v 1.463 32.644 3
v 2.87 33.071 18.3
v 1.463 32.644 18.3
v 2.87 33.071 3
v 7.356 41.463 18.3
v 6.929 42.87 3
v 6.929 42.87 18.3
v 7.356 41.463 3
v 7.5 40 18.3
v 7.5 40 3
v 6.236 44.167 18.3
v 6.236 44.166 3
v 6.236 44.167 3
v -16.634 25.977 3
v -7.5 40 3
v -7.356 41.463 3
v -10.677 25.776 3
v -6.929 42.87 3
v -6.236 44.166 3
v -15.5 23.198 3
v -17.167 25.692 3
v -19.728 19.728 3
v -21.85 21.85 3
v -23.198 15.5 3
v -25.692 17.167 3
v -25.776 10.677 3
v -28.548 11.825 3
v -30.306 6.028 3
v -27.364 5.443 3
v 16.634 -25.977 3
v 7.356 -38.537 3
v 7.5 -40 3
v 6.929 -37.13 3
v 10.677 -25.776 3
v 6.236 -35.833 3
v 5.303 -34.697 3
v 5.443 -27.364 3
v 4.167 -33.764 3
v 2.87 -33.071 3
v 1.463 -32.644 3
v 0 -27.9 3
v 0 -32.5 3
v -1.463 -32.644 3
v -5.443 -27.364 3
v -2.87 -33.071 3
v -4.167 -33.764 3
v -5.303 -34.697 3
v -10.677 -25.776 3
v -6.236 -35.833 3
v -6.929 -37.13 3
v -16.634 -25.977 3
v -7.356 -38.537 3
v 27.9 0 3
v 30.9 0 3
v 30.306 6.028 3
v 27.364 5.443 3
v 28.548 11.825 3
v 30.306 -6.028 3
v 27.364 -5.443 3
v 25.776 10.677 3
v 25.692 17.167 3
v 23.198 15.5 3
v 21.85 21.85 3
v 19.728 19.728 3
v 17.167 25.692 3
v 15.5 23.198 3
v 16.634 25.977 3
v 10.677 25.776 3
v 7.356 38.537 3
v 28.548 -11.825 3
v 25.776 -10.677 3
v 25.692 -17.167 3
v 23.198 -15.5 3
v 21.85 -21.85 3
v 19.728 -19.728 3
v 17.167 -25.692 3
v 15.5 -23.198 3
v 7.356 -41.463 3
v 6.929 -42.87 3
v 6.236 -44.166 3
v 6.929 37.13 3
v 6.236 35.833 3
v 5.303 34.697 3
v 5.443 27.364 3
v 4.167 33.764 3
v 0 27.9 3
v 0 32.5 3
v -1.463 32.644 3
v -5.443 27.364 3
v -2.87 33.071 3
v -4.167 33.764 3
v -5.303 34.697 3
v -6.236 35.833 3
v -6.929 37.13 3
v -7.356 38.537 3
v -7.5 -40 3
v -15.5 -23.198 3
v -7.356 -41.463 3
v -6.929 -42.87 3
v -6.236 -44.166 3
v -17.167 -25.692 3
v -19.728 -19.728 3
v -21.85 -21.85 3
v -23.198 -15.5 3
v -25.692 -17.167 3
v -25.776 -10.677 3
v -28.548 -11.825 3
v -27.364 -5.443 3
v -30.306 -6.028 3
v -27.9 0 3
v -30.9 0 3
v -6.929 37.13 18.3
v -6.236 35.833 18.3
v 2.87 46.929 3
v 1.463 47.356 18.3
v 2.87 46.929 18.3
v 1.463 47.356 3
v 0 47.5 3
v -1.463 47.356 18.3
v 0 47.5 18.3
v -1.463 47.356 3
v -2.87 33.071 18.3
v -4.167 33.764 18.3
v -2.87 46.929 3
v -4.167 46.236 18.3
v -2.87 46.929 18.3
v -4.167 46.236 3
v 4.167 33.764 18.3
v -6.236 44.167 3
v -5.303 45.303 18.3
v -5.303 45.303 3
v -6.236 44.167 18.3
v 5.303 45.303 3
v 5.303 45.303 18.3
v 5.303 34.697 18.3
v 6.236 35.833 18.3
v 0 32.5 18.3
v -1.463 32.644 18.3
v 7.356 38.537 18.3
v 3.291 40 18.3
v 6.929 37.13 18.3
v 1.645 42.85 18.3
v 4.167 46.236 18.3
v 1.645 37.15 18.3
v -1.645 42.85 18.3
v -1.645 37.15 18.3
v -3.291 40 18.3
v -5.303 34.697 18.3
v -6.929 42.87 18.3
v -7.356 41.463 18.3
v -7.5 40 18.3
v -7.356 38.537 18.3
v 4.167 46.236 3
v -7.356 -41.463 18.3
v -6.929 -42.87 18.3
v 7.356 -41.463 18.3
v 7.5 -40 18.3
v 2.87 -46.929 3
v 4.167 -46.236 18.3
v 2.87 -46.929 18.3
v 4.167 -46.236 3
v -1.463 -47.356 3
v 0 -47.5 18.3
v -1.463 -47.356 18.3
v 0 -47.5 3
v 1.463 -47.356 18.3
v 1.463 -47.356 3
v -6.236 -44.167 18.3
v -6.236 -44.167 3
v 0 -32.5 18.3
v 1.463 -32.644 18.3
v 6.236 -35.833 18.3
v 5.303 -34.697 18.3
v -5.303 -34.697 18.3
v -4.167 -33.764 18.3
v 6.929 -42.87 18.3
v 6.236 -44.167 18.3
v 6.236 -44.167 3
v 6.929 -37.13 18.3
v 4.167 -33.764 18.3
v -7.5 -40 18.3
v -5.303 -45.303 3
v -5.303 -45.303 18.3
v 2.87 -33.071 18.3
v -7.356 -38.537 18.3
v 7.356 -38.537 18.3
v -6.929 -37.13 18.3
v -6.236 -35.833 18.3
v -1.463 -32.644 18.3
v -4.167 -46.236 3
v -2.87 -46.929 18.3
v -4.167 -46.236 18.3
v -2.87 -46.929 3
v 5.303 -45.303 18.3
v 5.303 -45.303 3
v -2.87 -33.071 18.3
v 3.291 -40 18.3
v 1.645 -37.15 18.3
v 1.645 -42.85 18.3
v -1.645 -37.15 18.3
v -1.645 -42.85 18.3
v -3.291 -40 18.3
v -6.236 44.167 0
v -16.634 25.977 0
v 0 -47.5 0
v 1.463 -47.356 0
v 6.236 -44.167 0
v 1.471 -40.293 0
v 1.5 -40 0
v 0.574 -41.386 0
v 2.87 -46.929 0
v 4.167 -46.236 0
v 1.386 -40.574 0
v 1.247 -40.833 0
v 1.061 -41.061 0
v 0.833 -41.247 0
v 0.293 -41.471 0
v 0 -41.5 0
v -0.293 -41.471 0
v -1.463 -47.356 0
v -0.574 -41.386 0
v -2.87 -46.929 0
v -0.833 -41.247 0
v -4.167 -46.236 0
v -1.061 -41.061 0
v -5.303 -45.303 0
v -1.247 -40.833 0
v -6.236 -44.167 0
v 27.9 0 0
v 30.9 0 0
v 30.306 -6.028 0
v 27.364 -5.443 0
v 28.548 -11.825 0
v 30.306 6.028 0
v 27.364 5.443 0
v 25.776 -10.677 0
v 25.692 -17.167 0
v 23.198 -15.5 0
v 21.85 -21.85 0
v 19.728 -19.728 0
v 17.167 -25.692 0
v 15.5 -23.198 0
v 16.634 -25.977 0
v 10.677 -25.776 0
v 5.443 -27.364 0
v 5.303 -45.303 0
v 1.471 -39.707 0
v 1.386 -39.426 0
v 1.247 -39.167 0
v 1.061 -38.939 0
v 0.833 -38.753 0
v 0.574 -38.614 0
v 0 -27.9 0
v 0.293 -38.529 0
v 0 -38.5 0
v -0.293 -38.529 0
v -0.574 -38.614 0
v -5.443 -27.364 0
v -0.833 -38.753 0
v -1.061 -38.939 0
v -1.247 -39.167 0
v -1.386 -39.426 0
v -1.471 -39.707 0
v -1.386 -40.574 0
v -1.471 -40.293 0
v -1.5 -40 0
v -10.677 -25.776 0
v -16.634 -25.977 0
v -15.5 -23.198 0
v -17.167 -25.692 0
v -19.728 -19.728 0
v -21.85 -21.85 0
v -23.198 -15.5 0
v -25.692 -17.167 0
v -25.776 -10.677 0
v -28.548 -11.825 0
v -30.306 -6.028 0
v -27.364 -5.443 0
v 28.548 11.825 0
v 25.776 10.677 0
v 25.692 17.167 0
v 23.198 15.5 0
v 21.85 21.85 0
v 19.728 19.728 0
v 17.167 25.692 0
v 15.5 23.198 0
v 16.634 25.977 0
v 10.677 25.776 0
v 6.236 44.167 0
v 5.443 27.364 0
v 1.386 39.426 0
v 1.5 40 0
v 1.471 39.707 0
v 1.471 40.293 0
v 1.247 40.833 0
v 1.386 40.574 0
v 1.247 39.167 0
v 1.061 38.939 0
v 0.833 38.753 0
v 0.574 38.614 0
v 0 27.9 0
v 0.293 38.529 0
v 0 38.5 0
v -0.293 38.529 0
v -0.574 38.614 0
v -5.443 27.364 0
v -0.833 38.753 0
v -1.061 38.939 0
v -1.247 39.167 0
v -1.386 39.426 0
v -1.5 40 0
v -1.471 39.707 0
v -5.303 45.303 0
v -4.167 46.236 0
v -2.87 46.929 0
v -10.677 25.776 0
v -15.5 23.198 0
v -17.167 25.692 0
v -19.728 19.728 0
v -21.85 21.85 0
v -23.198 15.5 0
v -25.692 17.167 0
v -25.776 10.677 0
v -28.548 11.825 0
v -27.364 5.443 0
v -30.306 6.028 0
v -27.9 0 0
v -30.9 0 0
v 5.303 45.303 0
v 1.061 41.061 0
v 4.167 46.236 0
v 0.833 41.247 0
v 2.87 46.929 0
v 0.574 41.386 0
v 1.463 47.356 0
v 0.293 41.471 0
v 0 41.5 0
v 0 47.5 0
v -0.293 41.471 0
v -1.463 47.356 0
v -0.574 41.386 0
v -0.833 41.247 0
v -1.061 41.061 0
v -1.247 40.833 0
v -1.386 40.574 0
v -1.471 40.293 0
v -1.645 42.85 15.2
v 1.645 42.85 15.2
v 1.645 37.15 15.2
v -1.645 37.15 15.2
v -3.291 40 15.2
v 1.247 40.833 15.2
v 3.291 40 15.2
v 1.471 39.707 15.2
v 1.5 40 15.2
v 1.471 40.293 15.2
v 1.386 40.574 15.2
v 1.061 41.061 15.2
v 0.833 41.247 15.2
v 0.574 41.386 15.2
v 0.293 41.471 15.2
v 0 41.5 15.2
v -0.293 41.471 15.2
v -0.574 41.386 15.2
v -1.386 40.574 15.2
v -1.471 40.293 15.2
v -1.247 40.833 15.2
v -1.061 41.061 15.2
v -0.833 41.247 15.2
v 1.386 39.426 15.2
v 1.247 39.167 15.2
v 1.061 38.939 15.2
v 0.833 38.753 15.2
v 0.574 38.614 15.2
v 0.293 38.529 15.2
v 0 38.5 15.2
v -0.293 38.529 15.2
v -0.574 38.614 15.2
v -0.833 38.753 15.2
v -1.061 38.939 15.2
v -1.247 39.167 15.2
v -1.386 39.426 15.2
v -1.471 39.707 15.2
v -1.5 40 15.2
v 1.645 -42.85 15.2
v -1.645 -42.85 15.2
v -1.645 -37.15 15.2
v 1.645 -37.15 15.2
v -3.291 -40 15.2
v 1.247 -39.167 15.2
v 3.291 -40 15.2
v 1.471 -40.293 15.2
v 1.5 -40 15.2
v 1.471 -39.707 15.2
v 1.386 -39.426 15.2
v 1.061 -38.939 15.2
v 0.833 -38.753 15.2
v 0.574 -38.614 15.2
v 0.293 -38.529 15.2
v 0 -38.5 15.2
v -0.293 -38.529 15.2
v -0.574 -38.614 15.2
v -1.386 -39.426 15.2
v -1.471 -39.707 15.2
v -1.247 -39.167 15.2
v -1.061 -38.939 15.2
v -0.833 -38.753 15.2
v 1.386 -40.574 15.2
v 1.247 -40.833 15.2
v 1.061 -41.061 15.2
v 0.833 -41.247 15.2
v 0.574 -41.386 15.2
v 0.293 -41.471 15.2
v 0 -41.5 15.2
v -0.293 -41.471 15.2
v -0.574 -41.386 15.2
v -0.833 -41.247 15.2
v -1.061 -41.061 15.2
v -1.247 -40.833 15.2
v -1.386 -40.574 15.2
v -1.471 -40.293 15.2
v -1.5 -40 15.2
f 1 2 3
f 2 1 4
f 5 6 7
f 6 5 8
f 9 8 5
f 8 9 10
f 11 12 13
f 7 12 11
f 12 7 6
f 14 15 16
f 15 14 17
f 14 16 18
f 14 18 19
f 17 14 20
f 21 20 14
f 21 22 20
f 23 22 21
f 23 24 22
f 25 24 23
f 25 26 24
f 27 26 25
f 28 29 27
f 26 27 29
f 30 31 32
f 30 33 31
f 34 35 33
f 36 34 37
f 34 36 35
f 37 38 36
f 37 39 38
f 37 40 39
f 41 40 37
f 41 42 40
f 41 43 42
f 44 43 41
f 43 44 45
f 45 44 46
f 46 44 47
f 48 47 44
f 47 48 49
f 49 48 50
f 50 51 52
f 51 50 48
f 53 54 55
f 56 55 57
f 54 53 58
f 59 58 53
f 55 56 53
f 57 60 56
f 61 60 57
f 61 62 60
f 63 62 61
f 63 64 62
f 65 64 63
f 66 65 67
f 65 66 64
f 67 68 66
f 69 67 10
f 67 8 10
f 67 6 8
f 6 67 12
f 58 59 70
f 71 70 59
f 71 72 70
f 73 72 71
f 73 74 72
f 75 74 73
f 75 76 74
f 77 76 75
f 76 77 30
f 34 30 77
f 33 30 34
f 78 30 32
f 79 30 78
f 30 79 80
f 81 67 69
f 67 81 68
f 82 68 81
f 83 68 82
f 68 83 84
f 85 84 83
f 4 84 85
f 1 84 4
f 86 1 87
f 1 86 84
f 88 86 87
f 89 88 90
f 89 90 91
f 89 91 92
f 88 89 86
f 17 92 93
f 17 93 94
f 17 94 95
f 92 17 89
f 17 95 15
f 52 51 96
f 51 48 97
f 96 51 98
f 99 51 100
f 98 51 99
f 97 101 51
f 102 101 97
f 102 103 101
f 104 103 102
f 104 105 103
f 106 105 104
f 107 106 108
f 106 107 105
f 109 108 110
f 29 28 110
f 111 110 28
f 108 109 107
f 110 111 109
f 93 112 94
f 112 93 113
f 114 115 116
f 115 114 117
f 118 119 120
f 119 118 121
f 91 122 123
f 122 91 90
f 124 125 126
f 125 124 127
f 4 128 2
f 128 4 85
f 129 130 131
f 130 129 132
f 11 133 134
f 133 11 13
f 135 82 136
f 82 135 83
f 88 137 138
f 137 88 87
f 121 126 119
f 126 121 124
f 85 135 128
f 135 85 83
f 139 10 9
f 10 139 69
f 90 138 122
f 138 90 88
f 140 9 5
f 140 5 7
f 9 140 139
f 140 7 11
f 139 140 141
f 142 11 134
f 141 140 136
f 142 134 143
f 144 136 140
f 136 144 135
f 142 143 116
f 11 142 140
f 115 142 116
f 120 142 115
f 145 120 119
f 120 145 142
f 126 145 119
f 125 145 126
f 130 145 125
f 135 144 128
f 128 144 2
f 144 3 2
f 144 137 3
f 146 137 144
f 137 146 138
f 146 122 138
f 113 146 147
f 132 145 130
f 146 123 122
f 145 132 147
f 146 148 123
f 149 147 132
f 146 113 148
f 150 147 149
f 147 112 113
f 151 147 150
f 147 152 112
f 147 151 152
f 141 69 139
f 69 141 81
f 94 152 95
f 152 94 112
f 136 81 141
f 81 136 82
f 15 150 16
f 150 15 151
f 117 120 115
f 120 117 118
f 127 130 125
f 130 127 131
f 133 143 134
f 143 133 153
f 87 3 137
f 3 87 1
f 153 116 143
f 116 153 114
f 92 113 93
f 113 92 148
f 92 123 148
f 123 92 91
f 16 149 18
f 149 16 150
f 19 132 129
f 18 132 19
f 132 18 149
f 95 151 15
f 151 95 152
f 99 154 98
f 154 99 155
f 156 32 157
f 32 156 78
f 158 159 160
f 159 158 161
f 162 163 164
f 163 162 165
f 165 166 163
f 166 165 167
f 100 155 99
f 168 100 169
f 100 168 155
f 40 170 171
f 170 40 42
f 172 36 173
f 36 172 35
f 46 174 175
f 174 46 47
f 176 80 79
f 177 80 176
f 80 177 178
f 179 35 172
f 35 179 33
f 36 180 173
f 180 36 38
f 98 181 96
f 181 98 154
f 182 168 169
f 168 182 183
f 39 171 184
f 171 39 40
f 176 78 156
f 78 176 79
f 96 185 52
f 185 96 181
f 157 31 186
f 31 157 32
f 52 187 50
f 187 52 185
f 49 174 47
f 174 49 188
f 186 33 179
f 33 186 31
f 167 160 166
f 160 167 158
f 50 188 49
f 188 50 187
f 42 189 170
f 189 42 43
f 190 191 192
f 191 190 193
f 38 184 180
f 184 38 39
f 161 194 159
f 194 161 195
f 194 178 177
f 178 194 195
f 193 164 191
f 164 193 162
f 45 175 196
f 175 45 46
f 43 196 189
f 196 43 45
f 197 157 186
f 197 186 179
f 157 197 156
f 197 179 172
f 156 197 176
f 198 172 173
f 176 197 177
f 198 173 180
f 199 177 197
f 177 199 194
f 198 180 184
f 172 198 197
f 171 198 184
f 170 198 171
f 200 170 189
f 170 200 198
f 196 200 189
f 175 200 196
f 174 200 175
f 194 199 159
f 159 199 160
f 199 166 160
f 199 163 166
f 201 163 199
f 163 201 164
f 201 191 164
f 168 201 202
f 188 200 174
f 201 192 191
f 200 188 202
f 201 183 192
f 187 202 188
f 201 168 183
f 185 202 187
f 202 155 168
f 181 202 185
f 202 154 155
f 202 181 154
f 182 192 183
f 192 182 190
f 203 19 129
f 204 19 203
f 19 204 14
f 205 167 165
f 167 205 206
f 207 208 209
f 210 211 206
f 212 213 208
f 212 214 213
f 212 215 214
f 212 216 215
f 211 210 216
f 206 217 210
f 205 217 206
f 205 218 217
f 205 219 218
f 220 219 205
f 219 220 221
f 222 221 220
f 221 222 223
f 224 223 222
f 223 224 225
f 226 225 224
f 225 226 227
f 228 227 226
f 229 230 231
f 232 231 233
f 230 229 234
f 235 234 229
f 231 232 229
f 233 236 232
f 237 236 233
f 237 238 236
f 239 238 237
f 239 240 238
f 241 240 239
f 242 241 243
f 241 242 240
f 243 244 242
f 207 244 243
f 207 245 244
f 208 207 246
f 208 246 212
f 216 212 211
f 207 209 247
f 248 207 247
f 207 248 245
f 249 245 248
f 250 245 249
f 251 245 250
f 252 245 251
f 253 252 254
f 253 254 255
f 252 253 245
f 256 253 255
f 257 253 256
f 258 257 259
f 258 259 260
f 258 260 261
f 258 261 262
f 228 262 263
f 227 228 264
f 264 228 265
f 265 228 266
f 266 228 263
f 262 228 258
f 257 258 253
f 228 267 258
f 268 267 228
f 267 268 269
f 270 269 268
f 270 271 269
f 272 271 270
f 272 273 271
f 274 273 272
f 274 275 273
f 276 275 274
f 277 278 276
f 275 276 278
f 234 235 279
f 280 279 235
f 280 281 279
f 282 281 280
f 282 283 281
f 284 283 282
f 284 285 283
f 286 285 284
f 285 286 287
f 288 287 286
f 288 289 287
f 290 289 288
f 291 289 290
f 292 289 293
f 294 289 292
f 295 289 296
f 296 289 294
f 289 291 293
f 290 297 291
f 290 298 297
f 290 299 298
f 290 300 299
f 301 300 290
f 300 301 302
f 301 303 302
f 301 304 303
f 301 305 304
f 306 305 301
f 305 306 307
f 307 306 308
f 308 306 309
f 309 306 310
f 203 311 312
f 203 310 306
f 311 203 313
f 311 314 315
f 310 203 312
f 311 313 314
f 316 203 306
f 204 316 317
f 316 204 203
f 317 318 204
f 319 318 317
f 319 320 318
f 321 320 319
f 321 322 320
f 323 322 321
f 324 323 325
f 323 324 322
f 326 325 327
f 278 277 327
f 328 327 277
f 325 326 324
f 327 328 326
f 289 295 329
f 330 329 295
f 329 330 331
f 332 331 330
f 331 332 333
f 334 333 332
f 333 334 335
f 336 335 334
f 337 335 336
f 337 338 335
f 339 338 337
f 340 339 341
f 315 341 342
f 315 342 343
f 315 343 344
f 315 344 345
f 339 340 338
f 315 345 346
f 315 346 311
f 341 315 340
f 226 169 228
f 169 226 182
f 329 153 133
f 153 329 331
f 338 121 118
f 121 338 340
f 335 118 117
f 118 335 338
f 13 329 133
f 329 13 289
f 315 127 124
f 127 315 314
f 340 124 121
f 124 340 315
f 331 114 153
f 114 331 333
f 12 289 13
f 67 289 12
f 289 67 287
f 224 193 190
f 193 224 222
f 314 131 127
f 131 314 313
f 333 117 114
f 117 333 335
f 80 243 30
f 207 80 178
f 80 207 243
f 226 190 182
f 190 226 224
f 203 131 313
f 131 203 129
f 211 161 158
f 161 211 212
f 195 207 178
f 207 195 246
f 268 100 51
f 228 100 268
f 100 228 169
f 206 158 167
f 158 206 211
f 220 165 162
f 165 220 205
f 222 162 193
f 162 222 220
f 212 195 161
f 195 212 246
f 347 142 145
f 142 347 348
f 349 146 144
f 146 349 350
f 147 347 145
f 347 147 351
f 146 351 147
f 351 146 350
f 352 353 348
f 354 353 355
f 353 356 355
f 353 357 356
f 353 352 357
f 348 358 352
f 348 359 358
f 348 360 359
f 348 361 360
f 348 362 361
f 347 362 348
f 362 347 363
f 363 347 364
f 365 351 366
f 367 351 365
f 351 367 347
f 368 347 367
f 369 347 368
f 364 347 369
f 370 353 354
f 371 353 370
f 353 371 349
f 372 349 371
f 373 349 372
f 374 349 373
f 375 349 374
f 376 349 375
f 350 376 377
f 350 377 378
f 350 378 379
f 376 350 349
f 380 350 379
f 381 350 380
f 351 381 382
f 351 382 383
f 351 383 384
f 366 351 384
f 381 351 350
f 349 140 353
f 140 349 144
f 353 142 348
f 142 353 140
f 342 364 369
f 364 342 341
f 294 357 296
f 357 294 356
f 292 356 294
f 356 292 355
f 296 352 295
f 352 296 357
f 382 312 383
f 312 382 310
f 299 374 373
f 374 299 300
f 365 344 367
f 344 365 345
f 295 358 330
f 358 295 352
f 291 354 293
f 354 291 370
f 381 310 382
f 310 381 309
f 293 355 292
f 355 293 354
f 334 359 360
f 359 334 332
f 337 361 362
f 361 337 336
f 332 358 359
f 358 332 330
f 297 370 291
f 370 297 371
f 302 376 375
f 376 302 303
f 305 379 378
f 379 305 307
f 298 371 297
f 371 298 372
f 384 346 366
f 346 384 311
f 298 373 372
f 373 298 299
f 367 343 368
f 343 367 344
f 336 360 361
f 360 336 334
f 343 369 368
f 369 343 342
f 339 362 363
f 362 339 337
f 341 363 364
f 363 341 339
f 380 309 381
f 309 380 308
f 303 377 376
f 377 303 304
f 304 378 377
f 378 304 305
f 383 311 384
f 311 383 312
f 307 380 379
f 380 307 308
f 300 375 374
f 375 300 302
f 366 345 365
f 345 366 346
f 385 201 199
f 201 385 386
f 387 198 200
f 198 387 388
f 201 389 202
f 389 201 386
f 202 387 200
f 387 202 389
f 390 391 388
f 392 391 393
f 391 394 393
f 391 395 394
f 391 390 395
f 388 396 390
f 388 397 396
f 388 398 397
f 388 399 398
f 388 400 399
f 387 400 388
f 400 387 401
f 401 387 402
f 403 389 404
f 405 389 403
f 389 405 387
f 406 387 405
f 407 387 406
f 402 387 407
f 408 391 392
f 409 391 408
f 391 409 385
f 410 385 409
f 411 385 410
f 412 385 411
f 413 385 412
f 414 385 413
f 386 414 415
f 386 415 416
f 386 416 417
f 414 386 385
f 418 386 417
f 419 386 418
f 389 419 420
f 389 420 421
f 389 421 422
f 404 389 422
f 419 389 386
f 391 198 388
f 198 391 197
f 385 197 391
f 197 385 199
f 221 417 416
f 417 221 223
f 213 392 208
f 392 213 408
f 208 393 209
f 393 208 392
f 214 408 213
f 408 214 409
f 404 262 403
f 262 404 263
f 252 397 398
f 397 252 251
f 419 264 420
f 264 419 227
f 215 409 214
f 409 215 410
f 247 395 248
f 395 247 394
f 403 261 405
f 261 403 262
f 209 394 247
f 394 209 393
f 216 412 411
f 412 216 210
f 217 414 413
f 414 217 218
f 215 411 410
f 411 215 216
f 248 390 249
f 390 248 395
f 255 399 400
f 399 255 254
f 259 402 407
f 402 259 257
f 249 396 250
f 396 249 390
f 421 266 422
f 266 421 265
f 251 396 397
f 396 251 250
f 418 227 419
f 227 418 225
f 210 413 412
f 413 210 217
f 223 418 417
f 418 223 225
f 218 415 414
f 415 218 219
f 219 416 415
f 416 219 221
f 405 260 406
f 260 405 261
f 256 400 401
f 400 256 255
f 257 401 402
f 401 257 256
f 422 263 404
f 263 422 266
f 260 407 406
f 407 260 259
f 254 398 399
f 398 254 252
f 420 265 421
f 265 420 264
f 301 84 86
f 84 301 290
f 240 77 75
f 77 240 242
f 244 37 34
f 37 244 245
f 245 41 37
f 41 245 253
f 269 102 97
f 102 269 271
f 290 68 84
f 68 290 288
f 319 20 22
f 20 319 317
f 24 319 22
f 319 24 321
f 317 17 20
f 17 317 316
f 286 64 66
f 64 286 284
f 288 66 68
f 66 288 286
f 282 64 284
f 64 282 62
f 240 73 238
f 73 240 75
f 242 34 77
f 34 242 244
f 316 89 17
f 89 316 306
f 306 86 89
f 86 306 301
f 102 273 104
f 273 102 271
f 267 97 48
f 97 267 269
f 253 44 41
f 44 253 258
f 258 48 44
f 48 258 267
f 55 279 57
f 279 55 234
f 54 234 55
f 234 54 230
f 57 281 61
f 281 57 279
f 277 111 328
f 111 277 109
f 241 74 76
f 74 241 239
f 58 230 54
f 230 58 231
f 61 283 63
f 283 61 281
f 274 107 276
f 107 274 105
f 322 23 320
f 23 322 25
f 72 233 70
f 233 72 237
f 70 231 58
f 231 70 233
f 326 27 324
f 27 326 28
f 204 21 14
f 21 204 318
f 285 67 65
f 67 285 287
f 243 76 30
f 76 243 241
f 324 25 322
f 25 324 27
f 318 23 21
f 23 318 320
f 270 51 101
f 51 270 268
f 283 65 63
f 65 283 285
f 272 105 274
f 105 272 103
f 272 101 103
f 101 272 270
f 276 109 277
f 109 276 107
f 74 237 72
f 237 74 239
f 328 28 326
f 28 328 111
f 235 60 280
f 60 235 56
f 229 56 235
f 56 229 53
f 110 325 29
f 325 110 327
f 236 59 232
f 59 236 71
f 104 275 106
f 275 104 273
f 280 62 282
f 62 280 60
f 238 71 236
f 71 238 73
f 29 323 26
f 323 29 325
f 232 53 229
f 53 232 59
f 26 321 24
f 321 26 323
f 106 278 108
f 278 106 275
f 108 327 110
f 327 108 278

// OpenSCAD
// file: oem/generic/third_party/shortcuts.scad
// ShortCuts.scad 
// Autor: Rudolf Huttary, Berlin 2015
//
$fn = 100; 


//show_examples(); 

module show_examples()
	place_in_rect(30, 30)
	{
		Cy(h = 10); 
		CyH(h = 10); 
		CyH(h = 10, w = 30); 
		CyS(h = 10); 
		CyS(h = 10, w1 = 25, w2 = 75); 
		Cu(10); 
		Ri(h = 10); 
		RiH(h = 10); 
		RiS(h = 10, w1 = 10); 
		RiS(h = 10, w1 = 30, w2 = 300); 
		Sp(); 
		SpH(10, 30, 30); 
	}



module help()
{
echo("==============="); 
echo("help(): shows this help"); 
echo("show_examples(): shows some examples"); 
echo("place_in_rect(): places children objects in grid"); 
echo("Transformations:"); 
echo(" transform :  T(x=0, y=0, z=0), Tx(x=0) , Ty(y=0), Tz(z=0)"); 
echo(" rotate :  R(x=0, y=0, z=0), Rx(x=0) , Ry(y=0), Rz(z=0)"); 
echo(" scale :  S(x=1, y=1, z=1), Sx(x=1) , Sy(y=1), Sz(z=1)"); 
echo("Logical"); 
echo(" difference :  D()"); 
echo(" union :  U()"); 
echo(" intersection : *missing*"); 
echo("Primitives"); 
echo(" circle :  Ci(r=10)"); 
echo(" circle_half :  CiH(r=10, w=0)")
echo(" circle_segment :  CiS(r=10, w1=0, w2=90)")
echo(" square :  Sq(x=10, y=0, center=true))"); 
echo(" cylinder :  Cy(r=10, h=1, center=true)"); 
echo(" cylinder_half :  CyH(r=10, w=0)")
echo(" cylinder_segment: CyS(r=10, h=1, w1=0, w2=90,center=true)"); 
echo(" cylinder_segment: Pie(r=10, h=1, w1=0, w2=90,center=true)"); 
echo(" cube :  Cu(x=10, y=0, z=10, center=true)"); 
echo(" ring :  Ri(R=10, r=5, h=1, center=true)"); 
echo(" ring_half :  RiH(R=10, r=5, h=1, w=0 center=true)"); 
echo(" ring_segment :  RiS(R=10, r=5, h=1, w1=0, w2=90, center=true)"); 
echo(" sphere:  Sp(r=10))"); 
echo(" sphere_half:  SpH(r=10, w1 = 0, w2 = 0))"); 
echo("==============="); 
}


// Euclidean Transformations

module T(x=0, y=0, z=0){translate([x, y, z])children(); }
module Tx(x) { translate([x, 0, 0])children(); }
module Ty(y) { translate([0, y, 0])children(); }
module Tz(z) { translate([0, 0, z])children(); }


module R(x=0, y=0, z=0){rotate([x, y, z]) children();}
module Rx(x=90){rotate([x, 0, 0]) children();}
module Ry(y=90){rotate([0, y, 0]) children();}
module Rz(z=90){rotate([0, 0, z]) children();}

module S(x=1, y=1, z=1){scale([x, y, z]) children();}
module Sx(x=1){scale([x, 1, 1]) children();}
module Sy(y=1){scale([1, y, 1]) children();}
module Sz(z=1){scale([1, 1, z]) children();}


module D() difference(){children(0); children([1:$children-1]);}
module U() children([0:$children-1]);
// module I() intersection()children([0:$children-1]); // does not work for some reason


// primitives - 2D

module Sq(x =10, y = 0, center = true)
{
   if(y==0)
		square([x, x], center = center); 
	else
		square([x, y], center = center); 
}
module Ci(r = 10)
{
	circle(r = r); 
}

// derived primitives - 2d
module CiH(r = 10, w = 0)
  circle_half(r, w); 

module CiS(r = 10, w1 = 0, w2 = 90)
  circle_segment(r, w1, w2); 


// primitives - 3d
module Cy(r = 10, h = 1, center = true)
{
	cylinder(r = r, h = h, center = center); 
}
module Cu(x = 10, y = 0, z = 10, center = true)
{
  if (y==0)
	cube([x, x, x], center = center); 
  else
	cube([x, y, z], center = center); 
}

// derived primitives - 3d
module CyH(r = 10, h = 1, w = 0, center = true)
  cylinder_half(r, h, w, center); 

module CyS(r = 10, h = 1, w1 = 0, w2 = 90, center = true)
  cylinder_segment(r, h, w1, w2, center); 

module Ri(R = 10, r = 5, h = 1, center = true)
  ring(R, r, h, center); 

module RiS(R = 10, r = 5, h = 1, w1 = 0, w2 = 90, center = true)
   ring_segment(R, r, h, w1, w2, center); 

module RiH(r1 = 10, r2, h = 1, w = 0, center = true)
   ring_half(r1, r2, h, w, center); 
module Pie(r = 10, h = 1, w1 = 0, w2 = 90, center = true)
  cylinder_segment(r, h, w1, w2, center);  
module Sp(r = 10)
  sphere(r); 
module SpH(r = 10, w1 = 0, w2 = 0)
  sphere_half(r, w1, w2); 
module SpS(r = 10, w1 = 0, w2 = 90, w3 = 90)
  sphere_segment(r, w1, w2); 




// clear text definitions
module circle_half(r = 10, w = 0)
{
	difference()
	{
		circle(r); 
     rotate([0, 0, w-90])
     translate([0, -r])
		square([r, 2*r], center = false); 
	}
}

module circle_segment(r = 10, w1 = 0, w2 = 90)
{
  W2 = (w1>w2)?w2+360:w2; 
  if (W2-w1 < 180)
    intersection()
		{
       circle_half(r, w1); 
       circle_half(r, W2-180); 
 		}
	else
    union()
		{
       circle_half(r, w1); 
       circle_half(r, W2-180); 
 		}
}

module cylinder_half(r = 10, h = 1, w = 0, center = true)
{
  linear_extrude(height = h, center = center)
  circle_half(r, w); 
} 

module cylinder_segment(r = 10, h = 1, w1 = 0, w2 = 90, center = true)
{
  linear_extrude(height = h, center = center)
  circle_segment(r, w1, w2); 
} 

module ring(R = 10, r = 5, h = 1, center = true)
{
	difference()
	{
	cylinder(r = R, h = h, center = center); 
   translate([0, 0, -2*h])
	cylinder(r = r, h = 4*h, center = false); 
	}
}

module ring_half(R = 10, r = 5, h = 1, w = 0, center = true)
{
	difference()
	{
		ring(R, r, h, center); 
     rotate([0, 0, w])
     translate([0, -R/2, 0])
		cube([2*R, R, 3*h], center = true); 
	}
}

module ring_segment(R = 10, r = 5, h = 1, w1 = 0, w2 = 90, center = true)
{
  W2 = (w1>w2)?w2+360:w2; 
  if (W2-w1 < 180)
    intersection()
		{
       ring_half(R, r, h, w1, center); 
       ring_half(R, r, h, W2-180, center); 
 		}
	else
    union()
		{
       ring_half(R, r, h, w1, center); 
       ring_half(R, r, h, W2-180, center); 
 		}
}


module sphere_half(r = 10, w1 = 0, w2 = 0)
{  
	difference()
	{
   	sphere(r); 
      rotate([-w1, -w2, 0])
     	translate([0, 0, r])
		cube(2*r, 2*r, r, center = true); 
	}

}


// additional code
module place_in_rect(dx =20, dy=20)
{
  cols = ceil(sqrt($children)); 
  rows = floor(sqrt($children)); 
  for(i = [0:$children-1])
	{ 
	  T(dx*(-cols/2+(i%cols)+.5), dy*(rows/2-floor(i/cols)-.5))
		 children(i); 
	}
}
// file: oem/generic/third_party/springs.scad
include <shortcuts.scad>  // http://www.thingiverse.com/thing:644830
$fn = 100;
help();
//examples();  // slow!! F6 takes hours!
module examples()
{
place_in_rect(60, 60)
{
// examples spring:
	spring(Windings = 7, R = 10, r = 1, h = 20);  // clockwise
	R(90) spring(Windings = 3, R = 12, r = 2, h = -60); // ccw

// examples helicoils:
	helicoil(Windings = 10);  // square wire
	helicoil(clockwise = false, square = true);  // ccw + round wire

// examples elliptic rings:
	elliptic_ring(10, 5, 1);
	elliptic_ring(10, 10, 1);  // non elliptic
	elliptic_ring(h = 10);  // element of a spring
	elliptic_ring(h = 10, w = 240);  // partial ring

// example chain:
	U()
	{
	 Rx(90) T(15) elliptic_ring(); 
	 elliptic_ring(); 
	 Rx(90) T(-15) elliptic_ring(); 
	}
}
}

module help()
{
	echo("===== springs.scad - signatures [by Rudolf Huttary, Berlin] ===="); 
	echo("elliptic_ring(r1 = 10, r2 = 5, r = 2, slices = 100, h = 0, w = 360)
"); 
	echo("helicoil(Windings = 5, R = 20, r = 1, slices = 50, clockwise = true, square = true)"); 
	echo("spring(Windings = 5, R = 20, r=2, h = 20, slices = 50)"); 
	echo("elliptic_spring(Windings = 5, R1 = 20, R2 = 0, r=1, h = 20, slices = 50)"); 
	echo("===== springs.scad - end ===="); 
}


module elliptic_ring(r1 = 10, r2 = 5, r = 2, slices = 100, h = 0, w = 360)
{
	dz = h/slices; 
   dwx = atan(h/(r1+r2)/PI); 
	for (i = [0:slices-1])
	hull()
	{
		T(r1*cos((i+1)*w/slices), r2*sin((i+1)*w/slices), (i+1)*dz)
	   R(90+dwx, 0, (i+1)*w/slices)
		Cy(r = r, h = .01); 
	
		T(r1*cos((i)*w/slices), r2*sin((i)*w/slices), i*dz)
	   R(90+dwx, 0, i*w/slices)
		Cy(r = r, h = .01); 
	}
}

module helicoil(Windings = 5, R = 20, r = 1, slices = 50, clockwise = true, square = true)
{
  $fn = square? 4 :$fn; 
  h = clockwise?Windings*2*r:-Windings*2*r; 
  spring(Windings, R, r, h, slices); 
  T((.5*R)/2, r)
  Ry(90 )
  Cy(r, 1.5*R); 
}

module spring(Windings = 5, R = 20, r=2, h = 20, slices = 50)
	elliptic_spring(Windings, R, 0, r, h, slices); 

module elliptic_spring(Windings = 5, R1 = 20, R2 = 0, r=1, h = 20, slices = 50)
{
   dh = h/Windings;   
   r2 = (R2==0)?R1:R2; 
	for(j = [0:Windings-1])
		Tz(j*dh)
		elliptic_ring(R1, r2, r, slices, dh); 
}
// file: oem/m3_nut.scad
function vM3NutDatasheet() =
     [["e_min", 6.01], ["s_max", 5.5], ["m_max", 2.4]];



module mM3Nut() {
     import("stl/din934_m3_nut.stl");
}

mM3Nut();
// file: oem/f2276_sae1070_spring.scad
include <generic/lib.scad>;

use <generic/third_party/springs.scad>

function vF2276SAE1070SpringDatasheet() =
     let(wire_diameter=1, outer_diameter=18.1,
         inner_diameter=outer_diameter-2*wire_diameter,
         n_windings=8, free_length=43)
     [["outer_diameter", outer_diameter],
      ["inner_diameter", inner_diameter],
      ["wire_diameter", wire_diameter],
      ["pitch", free_length/n_windings],
      ["n_windings", n_windings],
      ["free_length", free_length]];

kF2276SAE1070SpringLength = property(vF2276SAE1070SpringDatasheet(), "free_length");

module mF2276SAE1070Spring(length=kF2276SAE1070SpringLength) {
     assert(length > 0);
     assert(length <= kF2276SAE1070SpringLength);

     datasheet = vF2276SAE1070SpringDatasheet();
     n_windings = property(datasheet, "n_windings");
     main_radius = (property(datasheet, "outer_diameter") +
                    property(datasheet, "inner_diameter")) / 4;
     wire_radius = property(datasheet, "wire_diameter") / 2;

     translate([0, 0, wire_radius])
     spring(Windings=n_windings, R=main_radius, r=wire_radius, h=length - 2 * wire_radius, slices=50);
}

mF2276SAE1070Spring();
// file: 50mm_ball_caster_spring_seat.scad
include <generic/lib.scad>;

use <oem/f2276_sae1070_spring.scad>;
use <oem/m3x5mm_threaded_insert.scad>;
use <oem/m3_nut.scad>;


function v50mmBallCasterSpringSeatDatasheet() =
     let(nut_datasheet = vM3NutDatasheet(),
         spring_datasheet=vF2276SAE1070SpringDatasheet(),
         nut_m_max=property(nut_datasheet, "m_max"),
         threaded_insert_datasheet=vM3x5mmThreadedInsertDatasheet(),
         threaded_insert_length=property(threaded_insert_datasheet, "length"),
         spring_outer_diameter=property(spring_datasheet, "outer_diameter"),
         spring_inner_diameter=property(spring_datasheet, "inner_diameter"),
         spring_wire_diameter=property(spring_datasheet, "wire_diameter"),
         spring_pitch=property(spring_datasheet, "pitch"), base_thickness=2)
     [["base_thickness", base_thickness],
      ["inner_diameter", spring_inner_diameter],
      ["outer_diameter", spring_outer_diameter + 2 * spring_wire_diameter],
      ["height", base_thickness + max(threaded_insert_length + nut_m_max, spring_pitch)]];


module m50mmBallCasterSpringSeat() {
     datasheet = v50mmBallCasterSpringSeatDatasheet();
     base_thickness = property(datasheet, "base_thickness");
     outer_diameter = property(datasheet, "outer_diameter");
     inner_diameter = property(datasheet, "inner_diameter");
     height = property(datasheet, "height");

     difference() {
          union() {
               cylinder(d=outer_diameter, h=base_thickness);
               cylinder(d=inner_diameter, h=height);
          }
          let(hole_diameter=property(vM3x5mmThreadedInsertDatasheet(), "nominal_diameter")) {
               translate([0, 0, -kEpsilon]) {
                    cylinder(d=hole_diameter, h=height + 2 * kEpsilon);
               }
          }
     }
}


m50mmBallCasterSpringSeat();
// file: oem/m3x5mm_threaded_insert.scad
include <generic/lib.scad>;

function vM3x5mmThreadedInsertDatasheet() =
     let(major_diameter=5.31)
     [["major_diameter", major_diameter],
      ["minor_diameter", major_diameter - 0.5],
      ["nominal_diameter", 3], ["length", 5]];

module mM3x5mmThreadedInsertTaperCone() {
     datasheet = vM3x5mmThreadedInsertDatasheet();
     translate([0, 0, -property(datasheet, "length")])
     cylinder(d1=property(datasheet, "minor_diameter"),
              d2=property(datasheet, "major_diameter"),
              h=property(datasheet, "length") + kEpsilon);
}

module mM3x5mmThreadedInsert() {
     import("stl/m3x5mm_threaded_insert.stl");
}

mM3x5mmThreadedInsert();
// file: generic/ball_caster_support.scad
include <lib.scad>;

use <ball_caster_yoke.scad>;

function pvBallCasterSupportDatasheet(ball_diameter, ball_protrusion, ball_gap,
                                      wall_gap, wall_thickness, base_thickness,
                                      mount_offset, mount_diameter) =
     assert(ball_diameter > 0)
     assert(ball_protrusion > 0)
     assert(ball_diameter > ball_protrusion)
     assert(ball_gap > 0)
     assert(wall_gap > 0)
     assert(ball_diameter > 2 * wall_gap)
     assert(wall_thickness > 0)
     assert(base_thickness > 0)
     assert(mount_offset > ball_diameter/2)
     assert(mount_diameter > 0)
     [["ball_diameter", ball_diameter], ["ball_protrusion", ball_protrusion], ["ball_gap", ball_gap],
      ["wall_gap", wall_gap], ["wall_thickness", wall_thickness], ["base_thickness", base_thickness],
      ["mount_offset", mount_offset], ["mount_diameter", mount_diameter],
      ["ball_z_offset", base_thickness + ball_gap + ball_diameter / 2],
      ["main_height", base_thickness + ball_gap + ball_diameter - ball_protrusion],
      ["main_diameter", ball_diameter + 2 * wall_thickness]];

module pmBallCasterSupport(datasheet) {
     base_thickness = property(datasheet, "base_thickness");
     main_height = property(datasheet, "main_height");
     main_diameter = property(datasheet, "main_diameter");
     mount_offset = property(datasheet, "mount_offset");
     mount_diameter = property(datasheet, "mount_diameter");
     ball_diameter = property(datasheet, "ball_diameter");
     ball_protrusion = property(datasheet, "ball_protrusion");
     ball_gap = property(datasheet, "ball_gap");
     ball_z_offset = property(datasheet, "ball_z_offset");
     wall_gap = property(datasheet, "wall_gap");
     wall_thickness = property(datasheet, "wall_thickness");

     pmBallCasterYoke(datasheet);
     rotate([0, 0, 90]) {
          translate([0, 0, base_thickness]) {
               difference() {
                    cylinder(h=main_height - base_thickness, d=main_diameter);
                    translate([0, 0, ball_z_offset - base_thickness]) sphere(d=ball_diameter);
                    translate([-main_diameter / 2 - kEpsilon, -wall_gap / 2, 0]) {
                         cube([main_diameter + 2 * kEpsilon, wall_gap, main_height - base_thickness + kEpsilon]);
                    }
                    translate([-main_diameter/2 - kEpsilon, 0, main_height - base_thickness - wall_gap/2]) {
                         rotate([0, 90, 0]) cylinder(h=main_diameter + 2 * kEpsilon, d=2 * wall_gap, $fn=6);
                    }
                    cylinder(h=ball_diameter/4 + ball_gap, d=ball_diameter * sqrt(3)/2);
               }
          }
     }
}

pmBallCasterSupport(
     datasheet=pvBallCasterSupportDatasheet(
          ball_diameter=10, ball_protrusion=3, ball_gap=2,
          wall_gap=3, wall_thickness=2, base_thickness=2,
          mount_offset=10, mount_diameter=4
     )
);
// file: oem/generic/standoffs.scad
include <lib.scad>;

use <third_party/threads.scad>;

function pvMetricHexStandoffDatasheet(length, width, hole_diameter=0, thread_pitch=0) =
     assert(length > 0)
     assert(width > 0)
     assert(hole_diameter >= 0)
     assert(width > hole_diameter)
     assert(thread_pitch >= 0)
     [["length", length], ["width", width], ["hole_diameter", hole_diameter], ["thread_pitch", thread_pitch]];


module pmMetricHexStandoff(datasheet) {
     width = property(datasheet, "width");
     length = property(datasheet, "length");
     hole_diameter = property(datasheet, "hole_diameter");
     thread_pitch = property(datasheet, "thread_pitch");
     difference() {
          cylinder(d=width / cos(30), h=length, $fn=6);
          translate([0, 0, -length/2]) {
               if (hole_diameter > 0) {
                    if (thread_pitch > 0) {
                         metric_thread(diameter=hole_diameter, pitch=thread_pitch,
                                       length=2 * length, internal=true);
                    } else {
                         cylinder(d=hole_diameter, h=2 * length);
                    }
               }
          }
     }
}

pmMetricHexStandoff(
     datasheet=pvMetricHexStandoffDatasheet(
          length=20, width=5, hole_diameter=3, thread_pitch=1
     )
);
// file: oem/generic/lib.scad
$fn = 32;

kEpsilon = 1e-1;

function property(table, key) = table[search([key], table)[0]][1];

module sector(radius, angles, fn = $fn) {
     r = radius / cos(180 / fn);
     step = -360 / fn;

     points = concat([[0, 0]],
                     [for(a = [angles[0] : step : angles[1] - 360])
                               [r * cos(a), r * sin(a)]
                          ],
                     [[r * cos(angles[1]), r * sin(angles[1])]]
          );

     difference() {
          circle(radius, $fn = fn);
          polygon(points);
     }
}

module ring(inner_radius, outer_radius, angles = [0, 360], fn = $fn) {
     difference() {
          sector(radius=outer_radius, angles=angles, fn=fn);
          sector(radius=inner_radius, angles=angles+[-kEpsilon, kEpsilon], fn=fn);
     }
}

module rounded_ring(inner_radius, outer_radius, angles = [0, 360], fn = $fn) {
     step_angle = 360 / fn;
     ring_width = outer_radius - inner_radius;
     ring_mean_radius = (outer_radius + inner_radius) / 2;
     for (theta = angles) {
          theta_d = theta / step_angle;
          theta_frac = (theta_d - floor(theta_d) - 0.5) * step_angle;
          rho = ring_mean_radius * cos(step_angle/2) / cos(theta_frac);
          rotate(theta)
          translate([rho, 0])
          circle(d=ring_width);
     }
     ring(inner_radius=inner_radius,
          outer_radius=outer_radius,
          angles=angles, fn=fn);
}

module fillet(r) {
     difference() {
          difference() {
               offset(r=-r - kEpsilon)
                    offset(delta=r) {
                    children();
               }
               offset(r=r)
                    offset(delta=-r) {
                    children();
               }
          }
          children();
     }
     offset(r=r)
          offset(delta=-r) {
          children();
     }
}

module bench_fillet(r, order=1000) {
     difference() {
          fillet(r) {
               translate([-order/2-kEpsilon, 0]) {
                    square([order, order], center=true);
               }
               children();
          }
          translate([-order/2-kEpsilon, 0]) {
               square([order+kEpsilon, order+kEpsilon], center=true);
          }
     }
}

module curved_bench_fillet(r, bench_radius, order=1000, internal=true) {
     difference() {
          fillet(r) {
               if (internal) {
                    translate([bench_radius, 0]) {
                         ring(inner_radius=bench_radius + kEpsilon, outer_radius=bench_radius * order);
                    }
               } else {
                    translate([-bench_radius, 0]) circle(r=bench_radius - kEpsilon);
               }
               children();
          }
          if (internal) {
               translate([bench_radius, 0]) {
                    ring(inner_radius=bench_radius,
                         outer_radius=bench_radius * order - kEpsilon);
               }
          } else {
               translate([-bench_radius, 0]) circle(r=bench_radius);
          }

     }
}


module window(side, position=[0, 0, 0], order=1000) {
    difference() {
        children();
        translate(position)  {
            difference() {
                square(order, center=true);
                square(side, center=true);
            }
        }
    }
}


module rounded_cylinder(diameter, height, fillet_radius, center) {
     translate([0, 0, ! center ? height/2 : 0]) {
          minkowski() {
               cylinder(d=(diameter - 2 * fillet_radius),
                        h=(height - 2 * fillet_radius),
                        center=true);
               sphere(r=fillet_radius);
          }
     }
}


module curved_support_xsection(support_radius, fillet_radius,
                               wall_inner_radius, wall_outer_radius,
                               hole_radius = 0, internal=true) {
     support_angular_width = (4 * support_radius / wall_outer_radius) * 180 / PI;
     wall_thickness = wall_outer_radius - wall_inner_radius;
     rotate([0, 0, internal ? 180 : 0]) {
          difference() {
               window(6*support_radius) {
                    curved_bench_fillet(fillet_radius, bench_radius=wall_inner_radius, internal=internal) {
                         hull() {
                              translate([support_radius + wall_thickness/2, 0]) {
                                   circle(r=support_radius);
                              }
                              rotate([0, 0, ! internal ? 180 : 0])
                              translate([wall_inner_radius + wall_thickness/2, 0]) {
                                   ring(inner_radius=wall_inner_radius,
                                        outer_radius=wall_outer_radius,
                                        angles=[180 - support_angular_width/2,
                                                180 + support_angular_width/2]);
                              }
                         }
                         rotate([0, 0, ! internal ? 180 : 0])
                         translate([wall_inner_radius + wall_thickness/2, 0]) {
                              ring(inner_radius=wall_inner_radius,
                                   outer_radius=wall_outer_radius,
                                   angles=[180 - support_angular_width,
                                           180 + support_angular_width]);
                         }
                    }
               }
               if (hole_radius > 0) {
                    translate([support_radius + wall_thickness/2, 0]) {
                         circle(r=hole_radius);
                    }
               }
          }
     }
}

module fill(upto=1000) {
     offset(delta=-upto) {
          offset(delta=upto) {
               children();
          }
     }
}

module outline(delta) {
     if (delta > 0) {
          difference() {
               offset(delta=delta) {
                    children();
               }
               children();
          }
     } else {
          difference() {
               children();
               offset(delta=delta) {
                    children();
               }
          }
     }
}

module duplicate(v) {
     children();
     mirror(v) children();
}

function steps(start, end, n) = [start:(end - start)/(n - 1):end];

function sigmoid(x) = 1.0 / (1.0 + exp(-x));

module sigmoid_profile(length, width, order=10, fn = $fn) {
     step = length / fn;
     points = concat(
          [[0, 0]],
          [for (x = [step:step:length-step]) [x, width * sigmoid(2 * order * ((x / length) - 0.5))]],
          [[length, width], [0, width]]

     );
     polygon(points=points);
}

module exp_nerve_xsection(height, length, decay_rate = 5, fn = $fn) {
     step = length / fn;
     points = concat(
          [[0, 0]],
          [for (x = [0:step:length-step]) [x, height * exp(-x/decay_rate)]],
          [[length, 0]]
          );
     polygon(points=points);
}

module exp_nerve(height, length, thickness, decay_rate = 3, fn = $fn) {
     rotate([90, 0, 0])
     linear_extrude(height=thickness, center=true) {
          exp_nerve_xsection(height, length, decay_rate, fn);
     }
}

module exp_corner_nerve(height, radius, angles, corner_radius = 0, decay_rate = 3, fn = $fn) {
     difference() {
          rotate_extrude() {
               if (corner_radius > 0) {
                    translate([corner_radius, 0, 0])
                    exp_nerve_xsection(height=height, length=radius, decay_rate=decay_rate, fn=fn);
               } else {
                    translate([-corner_radius, 0, 0])
                    mirror([1, 0, 0])
                    exp_nerve_xsection(height=height, length=radius, decay_rate=decay_rate, fn=fn);
               }
          }
          linear_extrude(height=2 * height, center=true) {
               sector(radius=radius + abs(corner_radius), angles=[angles[1], angles[0] + 360], fn=fn);
          }
     }
}
// file: chassis_base.scad
include <generic/lib.scad>;

function vChassisBaseDatasheet() =
     let(outer_diameter=420, thickness=2, inner_diameter=outer_diameter - 2 * thickness,
         base_height=100, height=120, inner_height=height - 2 * thickness)
     [["outer_diameter", outer_diameter], ["inner_diameter", inner_diameter],
      ["base_height", base_height], ["height", height], ["inner_height", inner_height],
      ["thickness", thickness], ["support_diameter", 10], ["z_offset", 20], ["fillet_radius", 4]];

module mChassisOuterVolume() {
     datasheet = vChassisBaseDatasheet();
     rounded_cylinder(diameter=property(datasheet, "outer_diameter"),
                      height=property(datasheet, "height"),
                      fillet_radius=property(datasheet, "fillet_radius"));
}

module mChassisInnerVolume() {
     datasheet = vChassisBaseDatasheet();
     translate([0, 0, property(datasheet, "thickness")]) {
          rounded_cylinder(diameter=property(datasheet, "inner_diameter"),
                           height=property(datasheet, "inner_height"),
                           fillet_radius=property(datasheet, "fillet_radius"));
     }
}

module mChassisBBox() {
     datasheet = vChassisBaseDatasheet();
     chassis_height = property(datasheet, "height");
     chassis_outer_diameter = property(datasheet, "outer_diameter");
     translate([0., 0., chassis_height/2]) {
          cube([chassis_outer_diameter, chassis_outer_diameter, chassis_height], center=true);
     }
}

module mChassisShell() {
     difference() {
          mChassisOuterVolume();
          mChassisInnerVolume();
     }
}

module mChassisVolumeConstrain() {
     datasheet = vChassisBaseDatasheet();
     height = property(datasheet, "height");
     outer_diameter = property(datasheet, "outer_diameter");
     fillet_radius = property(datasheet, "fillet_radius");
     difference() {
          rounded_cylinder(diameter=outer_diameter,
                           height=height,
                           fillet_radius=fillet_radius);
          difference() {
               translate([0, 0, -kEpsilon]) {
                    rounded_cylinder(diameter=outer_diameter + kEpsilon,
                                     height=height + 2 * kEpsilon,
                                     fillet_radius=fillet_radius);
               }
               children();
          }
     }
}
// file: 50mm_ball_caster_yoke.scad
include <generic/lib.scad>;

use <generic/ball_caster_yoke.scad>;

use <oem/m3x5mm_threaded_insert.scad>
use <oem/m3_hex_standoff.scad>;

use <50mm_ball_caster_support.scad>;
use <50mm_ball_caster_spring_seat.scad>;

function v50mmBallCasterYokeDatasheet() =
     let(caster_support_datasheet=v50mmBallCasterSupportDatasheet(),
         caster_spring_seat_datasheet=v50mmBallCasterSpringSeatDatasheet())
     pvBallCasterYokeDatasheet(main_diameter=property(caster_support_datasheet, "main_diameter"),
                               base_thickness=property(caster_support_datasheet, "base_thickness"),
                               mount_offset=property(caster_support_datasheet, "mount_offset"),
                               mount_diameter=property(caster_support_datasheet, "mount_diameter"),
                               mount_height=property(caster_spring_seat_datasheet, "height"));

module m50mmBallCasterYoke() {
     datasheet = v50mmBallCasterYokeDatasheet();
     base_thickness = property(datasheet, "base_thickness");
     mount_offset = property(datasheet, "mount_offset");
     mount_height = property(datasheet, "mount_height");

     difference() {
          pmBallCasterYoke(datasheet);
          translate([0, 0, -kEpsilon]) {
               duplicate([0, 1, 0]) {
                    translate([0, mount_offset, 0]) {
                         translate([0, 0, mount_height]) {
                              linear_extrude(height=base_thickness + 2 * kEpsilon) {
                                   offset(delta=kEpsilon) {
                                        hull() projection() mM3x30mmHexStandoff();
                                   }
                              }
                         }
                         let(hole_diameter=property(vM3x30mmHexStandoffDatasheet(), "hole_diameter")) {
                              cylinder(h=mount_height + base_thickness + 2 * kEpsilon, d=hole_diameter);
                         }
                    }
               }
               let(hole_diameter=property(vM3x5mmThreadedInsertDatasheet(), "nominal_diameter")) {
                    cylinder(h=base_thickness + 2 * kEpsilon, d=hole_diameter);
               }
          }
     }
}

m50mmBallCasterYoke();
// file: 50mm_ball_caster_support.scad
include <generic/lib.scad>;

use <generic/ball_caster_support.scad>;

use <oem/m3_hex_standoff.scad>;

function v50mmBallCasterSupportDatasheet() =
     pvBallCasterSupportDatasheet(ball_diameter=50.8, ball_protrusion=20, ball_gap=3,
                                  wall_gap=10, wall_thickness=2, base_thickness=3,
                                  mount_offset=40, mount_diameter=15);

module m50mmBallCasterSupport() {
     datasheet = v50mmBallCasterSupportDatasheet();
     base_thickness = property(datasheet, "base_thickness");
     mount_offset = property(datasheet, "mount_offset");
     difference() {
          pmBallCasterSupport(datasheet);
          translate([0, 0, -kEpsilon]) {
               duplicate([0, 1, 0]) {
                    translate([0, mount_offset, 0]) {
                         linear_extrude(height=base_thickness + 2 * kEpsilon) {
                              offset(delta=kEpsilon) {
                                   hull() projection() mM3x40mmHexStandoff();
                              }
                         }
                    }
               }
          }
     }
}

m50mmBallCasterSupport();
// file: oem/m3_hex_standoff.scad
include <generic/lib.scad>;

use <generic/standoffs.scad>;

function vM3x30mmHexThreadedStandoffDatasheet() =
     pvMetricHexStandoffDatasheet(hole_diameter=3, thread_pitch=0.5, length=30, width=5.5);

module mM3x30mmHexThreadedStandoff() {
     pmMetricHexStandoff(datasheet=vM3x30mmHexThreadedStandoffDatasheet());
}

function vM3x30mmHexStandoffDatasheet() =
     pvMetricHexStandoffDatasheet(hole_diameter=3, length=30, width=5.5);

module mM3x30mmHexStandoff() {
     pmMetricHexStandoff(datasheet=vM3x30mmHexStandoffDatasheet());
}


function vM3x40mmHexThreadedStandoffDatasheet() =
     pvMetricHexStandoffDatasheet(hole_diameter=3, thread_pitch=0.5, length=40, width=5.5);

module mM3x40mmHexThreadedStandoff() {
     pmMetricHexStandoff(datasheet=vM3x40mmHexThreadedStandoffDatasheet());
}

function vM3x40mmHexStandoffDatasheet() =
     pvMetricHexStandoffDatasheet(hole_diameter=3, length=40, width=5.5);

module mM3x40mmHexStandoff() {
     pmMetricHexStandoff(datasheet=vM3x40mmHexStandoffDatasheet());
}


function vM3x15mmHexThreadedStandoffDatasheet() =
     pvMetricHexStandoffDatasheet(hole_diameter=3, thread_pitch=0.5, length=15, width=5.5);

module mM3x15mmHexThreadedStandoff() {
     pmMetricHexStandoff(datasheet=vM3x15mmHexThreadedStandoffDatasheet());
}

function vM3x15mmHexStandoffDatasheet() =
     pvMetricHexStandoffDatasheet(hole_diameter=3, length=15, width=5.5);

module mM3x15mmHexStandoff() {
     pmMetricHexStandoff(datasheet=vM3x15mmHexStandoffDatasheet());
}
// file: generic/ball_caster_yoke.scad
include <lib.scad>;

function pvBallCasterYokeDatasheet(main_diameter, base_thickness, mount_offset, mount_diameter, mount_height=0) =
     assert(main_diameter > 0)
     assert(base_thickness > 0)
     assert(mount_offset > 0)
     assert(mount_diameter > 0)
     [["main_diameter", main_diameter], ["base_thickness", base_thickness],
      ["mount_offset", mount_offset], ["mount_diameter", mount_diameter],
      ["mount_height", mount_height]];

module pmBallCasterYoke(datasheet) {
     main_diameter = property(datasheet, "main_diameter");
     base_thickness = property(datasheet, "base_thickness");
     mount_offset = property(datasheet, "mount_offset");
     mount_diameter = property(datasheet, "mount_diameter");
     mount_height = property(datasheet, "mount_height");

     linear_extrude(height=base_thickness) {
          hull() {
               circle(d=main_diameter);
               duplicate([0, 1, 0]) {
                    translate([0, mount_offset, 0]) {
                         circle(d=mount_diameter);
                    }
               }
          }
     }
     if (mount_height > 0) {
          translate([0, 0, base_thickness]) {
               duplicate([0, 1, 0]) {
                    translate([0, mount_offset, 0]) {
                         cylinder(h=mount_height, d=mount_diameter);
                    }
               }
          }
     }
}

pmBallCasterYoke(
     datasheet=pvBallCasterYokeDatasheet(
          main_diameter=12, base_thickness=2, mount_offset=10, mount_diameter=4, mount_height=5
     )
);
// main file
include <generic/lib.scad>;

use <generic/ball_caster_yoke.scad>;

use <oem/m3_hex_standoff.scad>;

use <50mm_ball_caster_support.scad>;
use <50mm_ball_caster_yoke.scad>;
use <chassis_base.scad>;


function v50mmBallCasterBaseDatasheet() =
     let(chassis_datasheet = vChassisBaseDatasheet(),
         caster_support_datasheet = v50mmBallCasterSupportDatasheet(),
         chassis_thickness = property(chassis_datasheet, "thickness"),
         chassis_z_offset = property(chassis_datasheet, "z_offset"),
         main_diameter = property(caster_support_datasheet, "main_diameter"),
         ball_z_offset = property(caster_support_datasheet, "ball_z_offset"),
         ball_diameter = property(caster_support_datasheet, "ball_diameter"),
         base_thickness = property(caster_support_datasheet, "base_thickness"),
         standoff_length = property(vM3x30mmHexThreadedStandoffDatasheet(), "length"),
         support_z_offset = ball_z_offset + ball_diameter/2 - chassis_z_offset - chassis_thickness,
         standoff_z_offset = support_z_offset - base_thickness/2 - standoff_length/2)
     concat(
          pvBallCasterYokeDatasheet(main_diameter=property(caster_support_datasheet, "main_diameter"),
                                    base_thickness=property(caster_support_datasheet, "base_thickness"),
                                    mount_offset=property(caster_support_datasheet, "mount_offset"),
                                    mount_diameter=property(caster_support_datasheet, "mount_diameter"),
                                    mount_height=standoff_z_offset -  base_thickness),
          [["support_z_offset", support_z_offset], ["support_opening_diameter", main_diameter + 1],
           ["standoff_z_offset", standoff_z_offset], ["standoff_length", standoff_length]]
     );

module m50mmBallCasterBase() {
     datasheet = v50mmBallCasterBaseDatasheet();
     main_diameter = property(datasheet, "main_diameter");
     base_thickness = property(datasheet, "base_thickness");
     mount_offset = property(datasheet, "mount_offset");
     mount_height = property(datasheet, "mount_height");

     support_opening_diameter = property(datasheet, "support_opening_diameter");

     difference() {
          pmBallCasterYoke(datasheet);
          translate([0, 0, -kEpsilon]) {
               duplicate([0, 1, 0]) {
                    translate([0, mount_offset, 0]) {
                         translate([0, 0, mount_height]) {
                              linear_extrude(height=base_thickness + 2 * kEpsilon) {
                                   offset(delta=kEpsilon) {
                                        hull() projection() mM3x30mmHexStandoff();
                                   }
                              }
                         }
                         let(hole_diameter=property(vM3x30mmHexStandoffDatasheet(), "hole_diameter")) {
                              cylinder(h=mount_height + base_thickness + 2 * kEpsilon, d=hole_diameter);
                         }
                    }
               }
               cylinder(d=support_opening_diameter, h=base_thickness + 2 * kEpsilon);
          }
     }
     difference() {
          cylinder(d=support_opening_diameter + 2 * base_thickness, h=base_thickness);
          translate([0, 0, -kEpsilon]) {
               cylinder(d=support_opening_diameter, h=base_thickness + 2 * kEpsilon);
          }
     }
}

m50mmBallCasterBase();
